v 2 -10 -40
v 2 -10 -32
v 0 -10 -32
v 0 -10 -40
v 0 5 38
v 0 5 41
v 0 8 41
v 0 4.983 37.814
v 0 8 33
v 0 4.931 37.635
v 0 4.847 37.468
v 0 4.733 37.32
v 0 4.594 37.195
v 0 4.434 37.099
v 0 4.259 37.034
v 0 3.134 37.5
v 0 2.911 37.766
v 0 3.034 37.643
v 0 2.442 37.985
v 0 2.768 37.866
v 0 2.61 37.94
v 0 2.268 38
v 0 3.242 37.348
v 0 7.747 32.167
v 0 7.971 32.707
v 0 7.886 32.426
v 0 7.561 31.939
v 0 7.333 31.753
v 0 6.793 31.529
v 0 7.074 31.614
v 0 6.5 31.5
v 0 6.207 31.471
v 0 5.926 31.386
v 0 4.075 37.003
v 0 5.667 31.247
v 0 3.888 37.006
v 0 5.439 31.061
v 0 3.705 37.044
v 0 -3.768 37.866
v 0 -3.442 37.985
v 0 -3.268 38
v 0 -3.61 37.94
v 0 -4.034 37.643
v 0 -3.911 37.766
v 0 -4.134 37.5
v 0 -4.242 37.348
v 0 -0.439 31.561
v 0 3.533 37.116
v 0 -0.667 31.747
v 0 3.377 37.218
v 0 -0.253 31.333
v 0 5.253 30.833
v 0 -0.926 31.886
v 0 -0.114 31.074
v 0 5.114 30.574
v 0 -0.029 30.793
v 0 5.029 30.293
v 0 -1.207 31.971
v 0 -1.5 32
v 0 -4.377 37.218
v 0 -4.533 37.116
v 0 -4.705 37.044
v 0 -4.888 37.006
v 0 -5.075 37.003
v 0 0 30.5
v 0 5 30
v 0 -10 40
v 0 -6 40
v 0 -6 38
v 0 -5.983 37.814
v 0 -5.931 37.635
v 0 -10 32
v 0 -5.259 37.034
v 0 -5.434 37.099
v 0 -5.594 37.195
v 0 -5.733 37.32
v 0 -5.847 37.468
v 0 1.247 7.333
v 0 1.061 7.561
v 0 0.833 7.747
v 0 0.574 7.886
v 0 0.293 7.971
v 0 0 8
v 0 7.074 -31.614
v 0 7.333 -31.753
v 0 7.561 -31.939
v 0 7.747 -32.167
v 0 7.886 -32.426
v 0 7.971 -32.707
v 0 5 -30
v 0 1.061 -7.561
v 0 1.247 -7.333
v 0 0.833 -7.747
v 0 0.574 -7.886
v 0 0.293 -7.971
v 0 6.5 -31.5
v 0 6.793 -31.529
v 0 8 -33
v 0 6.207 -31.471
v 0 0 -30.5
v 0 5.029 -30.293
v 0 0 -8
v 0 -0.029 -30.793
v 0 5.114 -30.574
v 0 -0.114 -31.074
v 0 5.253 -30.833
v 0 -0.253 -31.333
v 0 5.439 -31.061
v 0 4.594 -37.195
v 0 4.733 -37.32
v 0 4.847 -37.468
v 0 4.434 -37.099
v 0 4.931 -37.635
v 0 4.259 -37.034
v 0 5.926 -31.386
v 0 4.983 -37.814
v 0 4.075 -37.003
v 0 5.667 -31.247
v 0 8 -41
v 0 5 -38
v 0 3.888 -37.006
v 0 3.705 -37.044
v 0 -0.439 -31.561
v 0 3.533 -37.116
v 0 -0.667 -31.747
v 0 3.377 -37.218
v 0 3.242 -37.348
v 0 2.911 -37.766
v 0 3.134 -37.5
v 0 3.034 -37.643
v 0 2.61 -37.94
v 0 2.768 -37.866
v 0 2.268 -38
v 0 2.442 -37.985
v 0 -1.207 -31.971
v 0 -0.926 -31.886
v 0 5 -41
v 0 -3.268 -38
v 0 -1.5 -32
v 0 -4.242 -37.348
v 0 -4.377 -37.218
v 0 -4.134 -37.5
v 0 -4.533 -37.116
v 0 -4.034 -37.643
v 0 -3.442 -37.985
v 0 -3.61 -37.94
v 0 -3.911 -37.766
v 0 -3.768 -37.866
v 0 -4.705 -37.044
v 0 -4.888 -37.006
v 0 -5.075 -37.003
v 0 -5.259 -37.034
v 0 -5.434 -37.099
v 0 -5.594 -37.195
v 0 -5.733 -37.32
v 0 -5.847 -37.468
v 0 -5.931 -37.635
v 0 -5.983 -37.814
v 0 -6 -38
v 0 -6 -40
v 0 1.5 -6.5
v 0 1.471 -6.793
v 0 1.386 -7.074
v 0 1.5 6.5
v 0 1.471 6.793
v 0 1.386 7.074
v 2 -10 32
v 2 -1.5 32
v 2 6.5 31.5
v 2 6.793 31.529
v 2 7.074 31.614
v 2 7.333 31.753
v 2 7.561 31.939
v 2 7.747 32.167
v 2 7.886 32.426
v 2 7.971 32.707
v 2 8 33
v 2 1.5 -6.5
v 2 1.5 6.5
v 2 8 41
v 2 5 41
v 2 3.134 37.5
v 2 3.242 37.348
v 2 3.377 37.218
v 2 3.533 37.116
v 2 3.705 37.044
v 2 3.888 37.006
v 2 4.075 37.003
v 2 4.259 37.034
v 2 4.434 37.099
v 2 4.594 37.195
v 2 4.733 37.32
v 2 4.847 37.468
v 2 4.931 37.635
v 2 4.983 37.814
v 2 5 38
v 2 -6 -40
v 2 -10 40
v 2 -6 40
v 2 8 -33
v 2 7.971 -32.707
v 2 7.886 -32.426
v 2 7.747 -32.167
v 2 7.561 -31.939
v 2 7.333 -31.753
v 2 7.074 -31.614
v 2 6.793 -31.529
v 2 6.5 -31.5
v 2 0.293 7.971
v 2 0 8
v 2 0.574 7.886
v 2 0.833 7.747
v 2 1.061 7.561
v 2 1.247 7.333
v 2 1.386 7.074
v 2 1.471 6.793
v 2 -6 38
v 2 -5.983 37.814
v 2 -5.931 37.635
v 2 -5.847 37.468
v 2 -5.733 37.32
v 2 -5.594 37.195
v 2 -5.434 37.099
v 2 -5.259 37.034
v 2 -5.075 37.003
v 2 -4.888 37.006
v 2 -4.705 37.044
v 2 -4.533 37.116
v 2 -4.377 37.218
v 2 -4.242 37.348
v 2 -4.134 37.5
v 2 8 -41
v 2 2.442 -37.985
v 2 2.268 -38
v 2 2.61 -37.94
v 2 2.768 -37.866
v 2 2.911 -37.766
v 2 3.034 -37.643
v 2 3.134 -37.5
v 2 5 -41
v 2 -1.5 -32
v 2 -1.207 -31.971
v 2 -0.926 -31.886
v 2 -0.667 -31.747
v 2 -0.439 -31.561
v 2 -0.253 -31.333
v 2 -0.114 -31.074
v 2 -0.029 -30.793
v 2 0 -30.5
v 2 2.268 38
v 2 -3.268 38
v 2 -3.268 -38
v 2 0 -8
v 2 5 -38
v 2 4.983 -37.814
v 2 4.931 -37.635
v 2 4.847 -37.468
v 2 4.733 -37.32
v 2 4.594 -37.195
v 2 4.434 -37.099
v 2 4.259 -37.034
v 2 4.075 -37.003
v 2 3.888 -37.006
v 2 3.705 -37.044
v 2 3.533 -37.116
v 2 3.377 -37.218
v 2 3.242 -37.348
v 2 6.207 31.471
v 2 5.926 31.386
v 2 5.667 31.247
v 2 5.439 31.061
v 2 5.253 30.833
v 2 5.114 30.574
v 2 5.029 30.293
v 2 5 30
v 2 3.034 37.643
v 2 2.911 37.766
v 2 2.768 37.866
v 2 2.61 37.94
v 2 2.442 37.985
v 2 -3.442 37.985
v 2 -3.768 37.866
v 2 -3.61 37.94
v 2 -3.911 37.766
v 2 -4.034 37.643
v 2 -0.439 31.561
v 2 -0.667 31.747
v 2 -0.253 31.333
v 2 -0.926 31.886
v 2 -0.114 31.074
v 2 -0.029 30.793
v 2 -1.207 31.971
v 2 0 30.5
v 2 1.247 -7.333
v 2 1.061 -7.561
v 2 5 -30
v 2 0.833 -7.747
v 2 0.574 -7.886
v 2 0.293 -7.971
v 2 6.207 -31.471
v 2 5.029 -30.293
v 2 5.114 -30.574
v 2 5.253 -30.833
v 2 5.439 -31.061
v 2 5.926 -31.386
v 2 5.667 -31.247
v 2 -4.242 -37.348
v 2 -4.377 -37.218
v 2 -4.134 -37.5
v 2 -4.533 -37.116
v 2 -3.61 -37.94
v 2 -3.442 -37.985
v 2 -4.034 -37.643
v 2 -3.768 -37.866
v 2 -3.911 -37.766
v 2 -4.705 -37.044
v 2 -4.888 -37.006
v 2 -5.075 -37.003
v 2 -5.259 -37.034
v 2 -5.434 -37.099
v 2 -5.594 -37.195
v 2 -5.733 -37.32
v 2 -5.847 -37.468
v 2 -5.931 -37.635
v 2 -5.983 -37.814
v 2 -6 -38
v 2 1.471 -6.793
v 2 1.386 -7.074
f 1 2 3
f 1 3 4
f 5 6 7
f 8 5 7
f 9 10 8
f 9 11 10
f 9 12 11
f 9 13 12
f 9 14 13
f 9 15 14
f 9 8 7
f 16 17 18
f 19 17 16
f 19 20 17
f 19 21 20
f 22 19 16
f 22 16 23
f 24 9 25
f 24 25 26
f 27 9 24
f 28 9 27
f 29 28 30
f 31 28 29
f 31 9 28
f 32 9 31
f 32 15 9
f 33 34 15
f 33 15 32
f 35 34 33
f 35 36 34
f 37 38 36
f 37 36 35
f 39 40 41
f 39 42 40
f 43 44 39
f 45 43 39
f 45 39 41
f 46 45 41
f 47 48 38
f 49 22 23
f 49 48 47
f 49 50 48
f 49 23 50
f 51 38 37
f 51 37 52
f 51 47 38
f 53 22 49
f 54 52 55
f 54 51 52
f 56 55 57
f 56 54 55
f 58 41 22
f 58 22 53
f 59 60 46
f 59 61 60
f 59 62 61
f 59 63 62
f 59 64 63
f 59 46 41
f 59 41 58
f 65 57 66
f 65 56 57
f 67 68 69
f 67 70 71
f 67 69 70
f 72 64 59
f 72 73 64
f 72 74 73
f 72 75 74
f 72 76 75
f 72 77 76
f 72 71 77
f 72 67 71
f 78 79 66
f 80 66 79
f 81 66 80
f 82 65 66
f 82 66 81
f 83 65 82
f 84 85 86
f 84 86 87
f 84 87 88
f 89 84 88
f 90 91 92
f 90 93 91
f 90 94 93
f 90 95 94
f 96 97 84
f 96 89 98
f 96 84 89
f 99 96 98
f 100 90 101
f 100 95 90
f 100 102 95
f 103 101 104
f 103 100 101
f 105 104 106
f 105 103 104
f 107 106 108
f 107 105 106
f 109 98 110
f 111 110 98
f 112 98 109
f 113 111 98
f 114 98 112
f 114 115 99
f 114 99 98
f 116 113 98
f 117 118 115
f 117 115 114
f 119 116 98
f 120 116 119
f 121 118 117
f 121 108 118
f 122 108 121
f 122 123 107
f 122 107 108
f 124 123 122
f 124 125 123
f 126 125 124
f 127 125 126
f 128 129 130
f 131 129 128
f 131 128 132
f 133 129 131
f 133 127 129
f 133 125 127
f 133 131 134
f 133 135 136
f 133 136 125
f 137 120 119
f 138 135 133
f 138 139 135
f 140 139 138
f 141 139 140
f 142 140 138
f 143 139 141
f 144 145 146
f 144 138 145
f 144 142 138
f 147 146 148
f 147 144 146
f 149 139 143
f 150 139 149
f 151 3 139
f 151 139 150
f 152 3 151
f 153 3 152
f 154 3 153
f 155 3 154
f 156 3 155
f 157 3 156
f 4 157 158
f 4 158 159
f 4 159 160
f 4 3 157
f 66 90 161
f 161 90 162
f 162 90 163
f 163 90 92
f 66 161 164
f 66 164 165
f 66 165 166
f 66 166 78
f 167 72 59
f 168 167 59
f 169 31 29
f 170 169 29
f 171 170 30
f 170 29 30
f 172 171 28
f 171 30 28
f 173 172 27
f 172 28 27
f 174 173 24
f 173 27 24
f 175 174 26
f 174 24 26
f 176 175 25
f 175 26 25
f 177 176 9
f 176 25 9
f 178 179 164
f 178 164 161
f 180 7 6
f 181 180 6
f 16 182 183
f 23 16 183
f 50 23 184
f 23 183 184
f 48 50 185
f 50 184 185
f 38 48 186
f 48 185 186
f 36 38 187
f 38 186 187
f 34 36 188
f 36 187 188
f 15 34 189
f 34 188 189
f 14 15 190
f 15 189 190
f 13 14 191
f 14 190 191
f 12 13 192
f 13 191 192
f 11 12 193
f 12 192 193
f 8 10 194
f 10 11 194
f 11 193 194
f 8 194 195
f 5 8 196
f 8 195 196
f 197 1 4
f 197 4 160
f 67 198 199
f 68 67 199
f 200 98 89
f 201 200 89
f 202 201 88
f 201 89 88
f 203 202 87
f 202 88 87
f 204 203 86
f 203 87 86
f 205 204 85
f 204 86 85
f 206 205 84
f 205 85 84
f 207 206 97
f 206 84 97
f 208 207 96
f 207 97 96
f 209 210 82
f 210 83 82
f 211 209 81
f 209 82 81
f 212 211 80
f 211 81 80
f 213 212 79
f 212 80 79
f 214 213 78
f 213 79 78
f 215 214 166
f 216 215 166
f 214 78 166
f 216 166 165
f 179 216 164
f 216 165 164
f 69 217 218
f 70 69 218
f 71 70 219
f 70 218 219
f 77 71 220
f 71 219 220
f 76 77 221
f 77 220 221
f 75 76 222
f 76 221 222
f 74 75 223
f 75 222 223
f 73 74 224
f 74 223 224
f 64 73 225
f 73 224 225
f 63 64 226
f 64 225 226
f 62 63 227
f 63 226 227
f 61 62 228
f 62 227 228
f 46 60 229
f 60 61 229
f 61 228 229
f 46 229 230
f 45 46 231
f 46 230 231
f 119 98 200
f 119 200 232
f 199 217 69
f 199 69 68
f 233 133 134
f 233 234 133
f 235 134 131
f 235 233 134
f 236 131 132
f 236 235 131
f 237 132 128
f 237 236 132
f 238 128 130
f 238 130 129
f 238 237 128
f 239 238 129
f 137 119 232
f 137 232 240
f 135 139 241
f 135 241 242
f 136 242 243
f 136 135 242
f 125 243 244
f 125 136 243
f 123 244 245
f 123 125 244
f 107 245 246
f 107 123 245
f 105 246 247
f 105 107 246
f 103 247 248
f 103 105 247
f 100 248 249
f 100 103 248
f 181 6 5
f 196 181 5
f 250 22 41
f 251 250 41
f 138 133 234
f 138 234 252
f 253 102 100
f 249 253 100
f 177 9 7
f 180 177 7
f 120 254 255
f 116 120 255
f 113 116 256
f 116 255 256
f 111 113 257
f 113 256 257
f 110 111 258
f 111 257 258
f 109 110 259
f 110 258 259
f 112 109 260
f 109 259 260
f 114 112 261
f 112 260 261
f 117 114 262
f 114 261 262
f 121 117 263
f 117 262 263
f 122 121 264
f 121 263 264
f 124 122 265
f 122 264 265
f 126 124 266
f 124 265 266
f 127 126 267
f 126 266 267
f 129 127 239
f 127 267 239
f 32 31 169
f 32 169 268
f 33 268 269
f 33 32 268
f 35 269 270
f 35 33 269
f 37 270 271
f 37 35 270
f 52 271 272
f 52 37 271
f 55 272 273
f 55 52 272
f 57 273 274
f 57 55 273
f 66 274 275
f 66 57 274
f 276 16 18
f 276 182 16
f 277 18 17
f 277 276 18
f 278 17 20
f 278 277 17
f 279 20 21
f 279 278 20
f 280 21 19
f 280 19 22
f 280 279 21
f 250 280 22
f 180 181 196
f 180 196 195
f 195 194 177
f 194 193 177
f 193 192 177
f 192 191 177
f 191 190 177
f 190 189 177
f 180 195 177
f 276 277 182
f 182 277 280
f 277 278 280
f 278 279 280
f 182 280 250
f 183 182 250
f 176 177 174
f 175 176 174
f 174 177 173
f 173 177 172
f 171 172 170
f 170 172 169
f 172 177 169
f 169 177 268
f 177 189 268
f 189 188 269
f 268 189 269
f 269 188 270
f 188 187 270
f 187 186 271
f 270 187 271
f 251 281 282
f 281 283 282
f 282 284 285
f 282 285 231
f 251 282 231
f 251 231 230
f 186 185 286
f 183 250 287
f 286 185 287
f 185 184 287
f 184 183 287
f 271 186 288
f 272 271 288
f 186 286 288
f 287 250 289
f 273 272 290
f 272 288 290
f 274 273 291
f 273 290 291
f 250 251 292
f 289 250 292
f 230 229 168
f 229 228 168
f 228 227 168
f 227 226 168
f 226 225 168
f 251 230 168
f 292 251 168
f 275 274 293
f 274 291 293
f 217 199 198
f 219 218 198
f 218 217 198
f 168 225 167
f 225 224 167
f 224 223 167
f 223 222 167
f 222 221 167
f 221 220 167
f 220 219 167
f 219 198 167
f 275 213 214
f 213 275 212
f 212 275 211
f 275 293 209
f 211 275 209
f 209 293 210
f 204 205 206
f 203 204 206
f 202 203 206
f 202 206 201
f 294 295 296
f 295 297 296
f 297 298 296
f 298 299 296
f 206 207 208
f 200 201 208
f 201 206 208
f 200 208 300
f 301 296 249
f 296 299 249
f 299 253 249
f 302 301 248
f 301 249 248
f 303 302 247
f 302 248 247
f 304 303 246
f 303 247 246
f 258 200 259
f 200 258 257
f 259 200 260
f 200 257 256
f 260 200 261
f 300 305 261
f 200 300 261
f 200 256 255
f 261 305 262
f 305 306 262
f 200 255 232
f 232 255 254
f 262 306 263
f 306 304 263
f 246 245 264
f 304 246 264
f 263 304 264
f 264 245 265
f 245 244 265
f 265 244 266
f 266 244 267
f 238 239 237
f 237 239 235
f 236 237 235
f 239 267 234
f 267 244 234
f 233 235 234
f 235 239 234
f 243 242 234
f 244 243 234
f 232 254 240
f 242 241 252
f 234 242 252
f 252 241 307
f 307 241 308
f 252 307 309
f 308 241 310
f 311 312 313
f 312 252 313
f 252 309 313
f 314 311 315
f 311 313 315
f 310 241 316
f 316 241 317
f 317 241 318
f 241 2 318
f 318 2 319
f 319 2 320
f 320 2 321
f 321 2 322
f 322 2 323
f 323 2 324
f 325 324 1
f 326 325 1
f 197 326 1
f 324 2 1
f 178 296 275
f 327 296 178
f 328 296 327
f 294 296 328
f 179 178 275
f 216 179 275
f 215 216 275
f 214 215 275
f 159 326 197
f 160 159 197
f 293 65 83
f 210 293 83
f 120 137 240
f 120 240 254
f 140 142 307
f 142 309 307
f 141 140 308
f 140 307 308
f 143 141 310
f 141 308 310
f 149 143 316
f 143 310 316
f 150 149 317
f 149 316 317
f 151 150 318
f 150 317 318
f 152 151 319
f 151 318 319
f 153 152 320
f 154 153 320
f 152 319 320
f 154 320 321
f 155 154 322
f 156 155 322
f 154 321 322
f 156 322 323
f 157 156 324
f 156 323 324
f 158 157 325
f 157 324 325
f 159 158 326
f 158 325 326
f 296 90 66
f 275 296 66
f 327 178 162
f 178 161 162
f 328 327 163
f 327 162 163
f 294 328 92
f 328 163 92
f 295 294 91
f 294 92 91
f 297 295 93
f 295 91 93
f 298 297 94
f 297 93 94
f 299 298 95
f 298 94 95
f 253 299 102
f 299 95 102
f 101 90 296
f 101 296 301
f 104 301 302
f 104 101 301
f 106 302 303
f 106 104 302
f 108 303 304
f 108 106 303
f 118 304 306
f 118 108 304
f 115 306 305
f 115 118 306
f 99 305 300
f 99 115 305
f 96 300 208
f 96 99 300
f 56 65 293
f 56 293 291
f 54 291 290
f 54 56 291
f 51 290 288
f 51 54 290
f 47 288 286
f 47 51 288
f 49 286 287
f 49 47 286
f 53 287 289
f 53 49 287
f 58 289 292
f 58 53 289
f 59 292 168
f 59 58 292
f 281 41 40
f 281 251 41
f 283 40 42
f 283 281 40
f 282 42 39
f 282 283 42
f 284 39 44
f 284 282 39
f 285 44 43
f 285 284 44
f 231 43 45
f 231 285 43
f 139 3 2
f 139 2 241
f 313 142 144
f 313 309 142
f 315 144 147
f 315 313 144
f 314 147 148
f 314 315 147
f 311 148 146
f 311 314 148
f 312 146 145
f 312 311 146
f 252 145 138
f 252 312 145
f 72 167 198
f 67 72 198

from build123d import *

# Parameters (mm, degrees)
EXTRUDE_1_DEPTH     = 2
SKETCH_3_W          = 2
SKETCH_3_H          = 4
EXTRUDE_2_DEPTH     = 2
SKETCH_4_W          = 16
SKETCH_4_H          = 3
CUT_EXTRUDE_1_DEPTH = 10
FILLET_1_R          = 1.5
SKETCH_5_R          = 1
CUT_EXTRUDE_2_DEPTH = 10
FILLET_2_R          = 1
FILLET_3_R          = 1.5


# Some blends are built 0.0001 mm under size
with BuildPart() as part:
    # 草图1 → 凸台-拉伸1 (new body)
    with BuildSketch(Plane(origin=(0, 0, 0), x_dir=(0, 0, -1), z_dir=(1, 0, 0))):
        Polygon((32, -10), (32, 0), (0, 0), (0, 5), (31.5, 5), (31.5, 8), (41, 8), (41, 5), (38, 5), (38, -10), align=None)
    extrude_1 = extrude(amount=EXTRUDE_1_DEPTH)

    # 草图3 → 凸台-拉伸2 (add)
    with BuildSketch(Plane(origin=(2, 0, 0), x_dir=(0, 0, -1), z_dir=(1, 0, 0))):
        with Locations((39, -8)):
            Rectangle(SKETCH_3_W, SKETCH_3_H)
    extrude_2 = extrude(amount=-EXTRUDE_2_DEPTH)

    # 镜向1: 凸台-拉伸1, 凸台-拉伸2 across plane
    add(extrude_1.mirror(Plane.XY))
    add(extrude_2.mirror(Plane.XY))

    # 草图4 → 切除-拉伸1 (cut)
    with BuildSketch(Plane(origin=(2, 0, 0), x_dir=(0, 0, -1), z_dir=(1, 0, 0))):
        Rectangle(SKETCH_4_W, SKETCH_4_H)
    extrude(amount=-CUT_EXTRUDE_1_DEPTH, mode=Mode.SUBTRACT)

    # 圆角1
    fillet_1_edges = [part.edges().sort_by_distance(p)[0] for p in [
        (1, 1.5, -8),
        (1, 1.5, 8),
    ]]
    fillet(fillet_1_edges, radius=FILLET_1_R - 0.0001)  # a hair under: the kernel refuses the full size

    # 草图5 → 切除-拉伸2 (cut)
    with BuildSketch(Plane(origin=(2, 0, 0), x_dir=(0, 0, -1), z_dir=(1, 0, 0))):
        with Locations((-38, 4)):
            Circle(SKETCH_5_R)
        with Locations((-38, -5)):
            Circle(SKETCH_5_R)
        with Locations((38, -5)):
            Circle(SKETCH_5_R)
        with Locations((38, 4)):
            Circle(SKETCH_5_R)
    extrude(amount=-CUT_EXTRUDE_2_DEPTH, mode=Mode.SUBTRACT)

    # 圆角2
    fillet_2_edges = [part.edges().sort_by_distance(p)[0] for p in [
        (1, 3, -38),
        (1, -4, -38),
        (1, -4, 38),
        (1, 3, 38),
    ]]
    fillet(fillet_2_edges, radius=FILLET_2_R)

    # 圆角3
    # the kernel refuses this fillet: 1.5 mm, written as the material it adds along each edge
    with BuildSketch(Plane(origin=(0, 0, 32), x_dir=(0, -1, 0), z_dir=(1, 0, 0)), Plane(origin=(0, 0, -32), x_dir=(0, 0, 1), z_dir=(1, 0, 0))) as fillet_3_piece_1:
        with BuildLine():
            CenterArc((FILLET_3_R, FILLET_3_R), FILLET_3_R, 180, 90)
            Line((0, FILLET_3_R), (0, 0))
            Line((0, 0), (FILLET_3_R, 0))
        make_face()
    extrude(amount=2)
    with BuildSketch(Plane(origin=(0, 5, -31.5), x_dir=(0, 0, 1), z_dir=(1, 0, 0)), Plane(origin=(0, 5, 31.5), x_dir=(0, 1, 0), z_dir=(1, 0, 0))) as fillet_3_piece_2:
        with BuildLine():
            CenterArc((FILLET_3_R, -FILLET_3_R), FILLET_3_R, 90, 90)
            Line((0, -FILLET_3_R), (0, 0))
            Line((0, 0), (FILLET_3_R, 0))
        make_face()
    extrude(amount=2)
    # the kernel refuses this fillet: 1.5 mm, written as the material it takes off along each edge
    with BuildSketch(Plane(origin=(-3.75, 8, -31.5), x_dir=(0, -1, 0), z_dir=(1, 0, 0)), Plane(origin=(-3.75, 8, 31.5), x_dir=(0, 0, 1), z_dir=(1, 0, 0))) as fillet_3_2_piece_1:
        with BuildLine():
            CenterArc((FILLET_3_R, FILLET_3_R), FILLET_3_R, 180, 90)
            Line((0, FILLET_3_R), (0, 0))
            Line((0, 0), (FILLET_3_R, 0))
        make_face()
    extrude(amount=9.5, mode=Mode.SUBTRACT)


solid = part.part
